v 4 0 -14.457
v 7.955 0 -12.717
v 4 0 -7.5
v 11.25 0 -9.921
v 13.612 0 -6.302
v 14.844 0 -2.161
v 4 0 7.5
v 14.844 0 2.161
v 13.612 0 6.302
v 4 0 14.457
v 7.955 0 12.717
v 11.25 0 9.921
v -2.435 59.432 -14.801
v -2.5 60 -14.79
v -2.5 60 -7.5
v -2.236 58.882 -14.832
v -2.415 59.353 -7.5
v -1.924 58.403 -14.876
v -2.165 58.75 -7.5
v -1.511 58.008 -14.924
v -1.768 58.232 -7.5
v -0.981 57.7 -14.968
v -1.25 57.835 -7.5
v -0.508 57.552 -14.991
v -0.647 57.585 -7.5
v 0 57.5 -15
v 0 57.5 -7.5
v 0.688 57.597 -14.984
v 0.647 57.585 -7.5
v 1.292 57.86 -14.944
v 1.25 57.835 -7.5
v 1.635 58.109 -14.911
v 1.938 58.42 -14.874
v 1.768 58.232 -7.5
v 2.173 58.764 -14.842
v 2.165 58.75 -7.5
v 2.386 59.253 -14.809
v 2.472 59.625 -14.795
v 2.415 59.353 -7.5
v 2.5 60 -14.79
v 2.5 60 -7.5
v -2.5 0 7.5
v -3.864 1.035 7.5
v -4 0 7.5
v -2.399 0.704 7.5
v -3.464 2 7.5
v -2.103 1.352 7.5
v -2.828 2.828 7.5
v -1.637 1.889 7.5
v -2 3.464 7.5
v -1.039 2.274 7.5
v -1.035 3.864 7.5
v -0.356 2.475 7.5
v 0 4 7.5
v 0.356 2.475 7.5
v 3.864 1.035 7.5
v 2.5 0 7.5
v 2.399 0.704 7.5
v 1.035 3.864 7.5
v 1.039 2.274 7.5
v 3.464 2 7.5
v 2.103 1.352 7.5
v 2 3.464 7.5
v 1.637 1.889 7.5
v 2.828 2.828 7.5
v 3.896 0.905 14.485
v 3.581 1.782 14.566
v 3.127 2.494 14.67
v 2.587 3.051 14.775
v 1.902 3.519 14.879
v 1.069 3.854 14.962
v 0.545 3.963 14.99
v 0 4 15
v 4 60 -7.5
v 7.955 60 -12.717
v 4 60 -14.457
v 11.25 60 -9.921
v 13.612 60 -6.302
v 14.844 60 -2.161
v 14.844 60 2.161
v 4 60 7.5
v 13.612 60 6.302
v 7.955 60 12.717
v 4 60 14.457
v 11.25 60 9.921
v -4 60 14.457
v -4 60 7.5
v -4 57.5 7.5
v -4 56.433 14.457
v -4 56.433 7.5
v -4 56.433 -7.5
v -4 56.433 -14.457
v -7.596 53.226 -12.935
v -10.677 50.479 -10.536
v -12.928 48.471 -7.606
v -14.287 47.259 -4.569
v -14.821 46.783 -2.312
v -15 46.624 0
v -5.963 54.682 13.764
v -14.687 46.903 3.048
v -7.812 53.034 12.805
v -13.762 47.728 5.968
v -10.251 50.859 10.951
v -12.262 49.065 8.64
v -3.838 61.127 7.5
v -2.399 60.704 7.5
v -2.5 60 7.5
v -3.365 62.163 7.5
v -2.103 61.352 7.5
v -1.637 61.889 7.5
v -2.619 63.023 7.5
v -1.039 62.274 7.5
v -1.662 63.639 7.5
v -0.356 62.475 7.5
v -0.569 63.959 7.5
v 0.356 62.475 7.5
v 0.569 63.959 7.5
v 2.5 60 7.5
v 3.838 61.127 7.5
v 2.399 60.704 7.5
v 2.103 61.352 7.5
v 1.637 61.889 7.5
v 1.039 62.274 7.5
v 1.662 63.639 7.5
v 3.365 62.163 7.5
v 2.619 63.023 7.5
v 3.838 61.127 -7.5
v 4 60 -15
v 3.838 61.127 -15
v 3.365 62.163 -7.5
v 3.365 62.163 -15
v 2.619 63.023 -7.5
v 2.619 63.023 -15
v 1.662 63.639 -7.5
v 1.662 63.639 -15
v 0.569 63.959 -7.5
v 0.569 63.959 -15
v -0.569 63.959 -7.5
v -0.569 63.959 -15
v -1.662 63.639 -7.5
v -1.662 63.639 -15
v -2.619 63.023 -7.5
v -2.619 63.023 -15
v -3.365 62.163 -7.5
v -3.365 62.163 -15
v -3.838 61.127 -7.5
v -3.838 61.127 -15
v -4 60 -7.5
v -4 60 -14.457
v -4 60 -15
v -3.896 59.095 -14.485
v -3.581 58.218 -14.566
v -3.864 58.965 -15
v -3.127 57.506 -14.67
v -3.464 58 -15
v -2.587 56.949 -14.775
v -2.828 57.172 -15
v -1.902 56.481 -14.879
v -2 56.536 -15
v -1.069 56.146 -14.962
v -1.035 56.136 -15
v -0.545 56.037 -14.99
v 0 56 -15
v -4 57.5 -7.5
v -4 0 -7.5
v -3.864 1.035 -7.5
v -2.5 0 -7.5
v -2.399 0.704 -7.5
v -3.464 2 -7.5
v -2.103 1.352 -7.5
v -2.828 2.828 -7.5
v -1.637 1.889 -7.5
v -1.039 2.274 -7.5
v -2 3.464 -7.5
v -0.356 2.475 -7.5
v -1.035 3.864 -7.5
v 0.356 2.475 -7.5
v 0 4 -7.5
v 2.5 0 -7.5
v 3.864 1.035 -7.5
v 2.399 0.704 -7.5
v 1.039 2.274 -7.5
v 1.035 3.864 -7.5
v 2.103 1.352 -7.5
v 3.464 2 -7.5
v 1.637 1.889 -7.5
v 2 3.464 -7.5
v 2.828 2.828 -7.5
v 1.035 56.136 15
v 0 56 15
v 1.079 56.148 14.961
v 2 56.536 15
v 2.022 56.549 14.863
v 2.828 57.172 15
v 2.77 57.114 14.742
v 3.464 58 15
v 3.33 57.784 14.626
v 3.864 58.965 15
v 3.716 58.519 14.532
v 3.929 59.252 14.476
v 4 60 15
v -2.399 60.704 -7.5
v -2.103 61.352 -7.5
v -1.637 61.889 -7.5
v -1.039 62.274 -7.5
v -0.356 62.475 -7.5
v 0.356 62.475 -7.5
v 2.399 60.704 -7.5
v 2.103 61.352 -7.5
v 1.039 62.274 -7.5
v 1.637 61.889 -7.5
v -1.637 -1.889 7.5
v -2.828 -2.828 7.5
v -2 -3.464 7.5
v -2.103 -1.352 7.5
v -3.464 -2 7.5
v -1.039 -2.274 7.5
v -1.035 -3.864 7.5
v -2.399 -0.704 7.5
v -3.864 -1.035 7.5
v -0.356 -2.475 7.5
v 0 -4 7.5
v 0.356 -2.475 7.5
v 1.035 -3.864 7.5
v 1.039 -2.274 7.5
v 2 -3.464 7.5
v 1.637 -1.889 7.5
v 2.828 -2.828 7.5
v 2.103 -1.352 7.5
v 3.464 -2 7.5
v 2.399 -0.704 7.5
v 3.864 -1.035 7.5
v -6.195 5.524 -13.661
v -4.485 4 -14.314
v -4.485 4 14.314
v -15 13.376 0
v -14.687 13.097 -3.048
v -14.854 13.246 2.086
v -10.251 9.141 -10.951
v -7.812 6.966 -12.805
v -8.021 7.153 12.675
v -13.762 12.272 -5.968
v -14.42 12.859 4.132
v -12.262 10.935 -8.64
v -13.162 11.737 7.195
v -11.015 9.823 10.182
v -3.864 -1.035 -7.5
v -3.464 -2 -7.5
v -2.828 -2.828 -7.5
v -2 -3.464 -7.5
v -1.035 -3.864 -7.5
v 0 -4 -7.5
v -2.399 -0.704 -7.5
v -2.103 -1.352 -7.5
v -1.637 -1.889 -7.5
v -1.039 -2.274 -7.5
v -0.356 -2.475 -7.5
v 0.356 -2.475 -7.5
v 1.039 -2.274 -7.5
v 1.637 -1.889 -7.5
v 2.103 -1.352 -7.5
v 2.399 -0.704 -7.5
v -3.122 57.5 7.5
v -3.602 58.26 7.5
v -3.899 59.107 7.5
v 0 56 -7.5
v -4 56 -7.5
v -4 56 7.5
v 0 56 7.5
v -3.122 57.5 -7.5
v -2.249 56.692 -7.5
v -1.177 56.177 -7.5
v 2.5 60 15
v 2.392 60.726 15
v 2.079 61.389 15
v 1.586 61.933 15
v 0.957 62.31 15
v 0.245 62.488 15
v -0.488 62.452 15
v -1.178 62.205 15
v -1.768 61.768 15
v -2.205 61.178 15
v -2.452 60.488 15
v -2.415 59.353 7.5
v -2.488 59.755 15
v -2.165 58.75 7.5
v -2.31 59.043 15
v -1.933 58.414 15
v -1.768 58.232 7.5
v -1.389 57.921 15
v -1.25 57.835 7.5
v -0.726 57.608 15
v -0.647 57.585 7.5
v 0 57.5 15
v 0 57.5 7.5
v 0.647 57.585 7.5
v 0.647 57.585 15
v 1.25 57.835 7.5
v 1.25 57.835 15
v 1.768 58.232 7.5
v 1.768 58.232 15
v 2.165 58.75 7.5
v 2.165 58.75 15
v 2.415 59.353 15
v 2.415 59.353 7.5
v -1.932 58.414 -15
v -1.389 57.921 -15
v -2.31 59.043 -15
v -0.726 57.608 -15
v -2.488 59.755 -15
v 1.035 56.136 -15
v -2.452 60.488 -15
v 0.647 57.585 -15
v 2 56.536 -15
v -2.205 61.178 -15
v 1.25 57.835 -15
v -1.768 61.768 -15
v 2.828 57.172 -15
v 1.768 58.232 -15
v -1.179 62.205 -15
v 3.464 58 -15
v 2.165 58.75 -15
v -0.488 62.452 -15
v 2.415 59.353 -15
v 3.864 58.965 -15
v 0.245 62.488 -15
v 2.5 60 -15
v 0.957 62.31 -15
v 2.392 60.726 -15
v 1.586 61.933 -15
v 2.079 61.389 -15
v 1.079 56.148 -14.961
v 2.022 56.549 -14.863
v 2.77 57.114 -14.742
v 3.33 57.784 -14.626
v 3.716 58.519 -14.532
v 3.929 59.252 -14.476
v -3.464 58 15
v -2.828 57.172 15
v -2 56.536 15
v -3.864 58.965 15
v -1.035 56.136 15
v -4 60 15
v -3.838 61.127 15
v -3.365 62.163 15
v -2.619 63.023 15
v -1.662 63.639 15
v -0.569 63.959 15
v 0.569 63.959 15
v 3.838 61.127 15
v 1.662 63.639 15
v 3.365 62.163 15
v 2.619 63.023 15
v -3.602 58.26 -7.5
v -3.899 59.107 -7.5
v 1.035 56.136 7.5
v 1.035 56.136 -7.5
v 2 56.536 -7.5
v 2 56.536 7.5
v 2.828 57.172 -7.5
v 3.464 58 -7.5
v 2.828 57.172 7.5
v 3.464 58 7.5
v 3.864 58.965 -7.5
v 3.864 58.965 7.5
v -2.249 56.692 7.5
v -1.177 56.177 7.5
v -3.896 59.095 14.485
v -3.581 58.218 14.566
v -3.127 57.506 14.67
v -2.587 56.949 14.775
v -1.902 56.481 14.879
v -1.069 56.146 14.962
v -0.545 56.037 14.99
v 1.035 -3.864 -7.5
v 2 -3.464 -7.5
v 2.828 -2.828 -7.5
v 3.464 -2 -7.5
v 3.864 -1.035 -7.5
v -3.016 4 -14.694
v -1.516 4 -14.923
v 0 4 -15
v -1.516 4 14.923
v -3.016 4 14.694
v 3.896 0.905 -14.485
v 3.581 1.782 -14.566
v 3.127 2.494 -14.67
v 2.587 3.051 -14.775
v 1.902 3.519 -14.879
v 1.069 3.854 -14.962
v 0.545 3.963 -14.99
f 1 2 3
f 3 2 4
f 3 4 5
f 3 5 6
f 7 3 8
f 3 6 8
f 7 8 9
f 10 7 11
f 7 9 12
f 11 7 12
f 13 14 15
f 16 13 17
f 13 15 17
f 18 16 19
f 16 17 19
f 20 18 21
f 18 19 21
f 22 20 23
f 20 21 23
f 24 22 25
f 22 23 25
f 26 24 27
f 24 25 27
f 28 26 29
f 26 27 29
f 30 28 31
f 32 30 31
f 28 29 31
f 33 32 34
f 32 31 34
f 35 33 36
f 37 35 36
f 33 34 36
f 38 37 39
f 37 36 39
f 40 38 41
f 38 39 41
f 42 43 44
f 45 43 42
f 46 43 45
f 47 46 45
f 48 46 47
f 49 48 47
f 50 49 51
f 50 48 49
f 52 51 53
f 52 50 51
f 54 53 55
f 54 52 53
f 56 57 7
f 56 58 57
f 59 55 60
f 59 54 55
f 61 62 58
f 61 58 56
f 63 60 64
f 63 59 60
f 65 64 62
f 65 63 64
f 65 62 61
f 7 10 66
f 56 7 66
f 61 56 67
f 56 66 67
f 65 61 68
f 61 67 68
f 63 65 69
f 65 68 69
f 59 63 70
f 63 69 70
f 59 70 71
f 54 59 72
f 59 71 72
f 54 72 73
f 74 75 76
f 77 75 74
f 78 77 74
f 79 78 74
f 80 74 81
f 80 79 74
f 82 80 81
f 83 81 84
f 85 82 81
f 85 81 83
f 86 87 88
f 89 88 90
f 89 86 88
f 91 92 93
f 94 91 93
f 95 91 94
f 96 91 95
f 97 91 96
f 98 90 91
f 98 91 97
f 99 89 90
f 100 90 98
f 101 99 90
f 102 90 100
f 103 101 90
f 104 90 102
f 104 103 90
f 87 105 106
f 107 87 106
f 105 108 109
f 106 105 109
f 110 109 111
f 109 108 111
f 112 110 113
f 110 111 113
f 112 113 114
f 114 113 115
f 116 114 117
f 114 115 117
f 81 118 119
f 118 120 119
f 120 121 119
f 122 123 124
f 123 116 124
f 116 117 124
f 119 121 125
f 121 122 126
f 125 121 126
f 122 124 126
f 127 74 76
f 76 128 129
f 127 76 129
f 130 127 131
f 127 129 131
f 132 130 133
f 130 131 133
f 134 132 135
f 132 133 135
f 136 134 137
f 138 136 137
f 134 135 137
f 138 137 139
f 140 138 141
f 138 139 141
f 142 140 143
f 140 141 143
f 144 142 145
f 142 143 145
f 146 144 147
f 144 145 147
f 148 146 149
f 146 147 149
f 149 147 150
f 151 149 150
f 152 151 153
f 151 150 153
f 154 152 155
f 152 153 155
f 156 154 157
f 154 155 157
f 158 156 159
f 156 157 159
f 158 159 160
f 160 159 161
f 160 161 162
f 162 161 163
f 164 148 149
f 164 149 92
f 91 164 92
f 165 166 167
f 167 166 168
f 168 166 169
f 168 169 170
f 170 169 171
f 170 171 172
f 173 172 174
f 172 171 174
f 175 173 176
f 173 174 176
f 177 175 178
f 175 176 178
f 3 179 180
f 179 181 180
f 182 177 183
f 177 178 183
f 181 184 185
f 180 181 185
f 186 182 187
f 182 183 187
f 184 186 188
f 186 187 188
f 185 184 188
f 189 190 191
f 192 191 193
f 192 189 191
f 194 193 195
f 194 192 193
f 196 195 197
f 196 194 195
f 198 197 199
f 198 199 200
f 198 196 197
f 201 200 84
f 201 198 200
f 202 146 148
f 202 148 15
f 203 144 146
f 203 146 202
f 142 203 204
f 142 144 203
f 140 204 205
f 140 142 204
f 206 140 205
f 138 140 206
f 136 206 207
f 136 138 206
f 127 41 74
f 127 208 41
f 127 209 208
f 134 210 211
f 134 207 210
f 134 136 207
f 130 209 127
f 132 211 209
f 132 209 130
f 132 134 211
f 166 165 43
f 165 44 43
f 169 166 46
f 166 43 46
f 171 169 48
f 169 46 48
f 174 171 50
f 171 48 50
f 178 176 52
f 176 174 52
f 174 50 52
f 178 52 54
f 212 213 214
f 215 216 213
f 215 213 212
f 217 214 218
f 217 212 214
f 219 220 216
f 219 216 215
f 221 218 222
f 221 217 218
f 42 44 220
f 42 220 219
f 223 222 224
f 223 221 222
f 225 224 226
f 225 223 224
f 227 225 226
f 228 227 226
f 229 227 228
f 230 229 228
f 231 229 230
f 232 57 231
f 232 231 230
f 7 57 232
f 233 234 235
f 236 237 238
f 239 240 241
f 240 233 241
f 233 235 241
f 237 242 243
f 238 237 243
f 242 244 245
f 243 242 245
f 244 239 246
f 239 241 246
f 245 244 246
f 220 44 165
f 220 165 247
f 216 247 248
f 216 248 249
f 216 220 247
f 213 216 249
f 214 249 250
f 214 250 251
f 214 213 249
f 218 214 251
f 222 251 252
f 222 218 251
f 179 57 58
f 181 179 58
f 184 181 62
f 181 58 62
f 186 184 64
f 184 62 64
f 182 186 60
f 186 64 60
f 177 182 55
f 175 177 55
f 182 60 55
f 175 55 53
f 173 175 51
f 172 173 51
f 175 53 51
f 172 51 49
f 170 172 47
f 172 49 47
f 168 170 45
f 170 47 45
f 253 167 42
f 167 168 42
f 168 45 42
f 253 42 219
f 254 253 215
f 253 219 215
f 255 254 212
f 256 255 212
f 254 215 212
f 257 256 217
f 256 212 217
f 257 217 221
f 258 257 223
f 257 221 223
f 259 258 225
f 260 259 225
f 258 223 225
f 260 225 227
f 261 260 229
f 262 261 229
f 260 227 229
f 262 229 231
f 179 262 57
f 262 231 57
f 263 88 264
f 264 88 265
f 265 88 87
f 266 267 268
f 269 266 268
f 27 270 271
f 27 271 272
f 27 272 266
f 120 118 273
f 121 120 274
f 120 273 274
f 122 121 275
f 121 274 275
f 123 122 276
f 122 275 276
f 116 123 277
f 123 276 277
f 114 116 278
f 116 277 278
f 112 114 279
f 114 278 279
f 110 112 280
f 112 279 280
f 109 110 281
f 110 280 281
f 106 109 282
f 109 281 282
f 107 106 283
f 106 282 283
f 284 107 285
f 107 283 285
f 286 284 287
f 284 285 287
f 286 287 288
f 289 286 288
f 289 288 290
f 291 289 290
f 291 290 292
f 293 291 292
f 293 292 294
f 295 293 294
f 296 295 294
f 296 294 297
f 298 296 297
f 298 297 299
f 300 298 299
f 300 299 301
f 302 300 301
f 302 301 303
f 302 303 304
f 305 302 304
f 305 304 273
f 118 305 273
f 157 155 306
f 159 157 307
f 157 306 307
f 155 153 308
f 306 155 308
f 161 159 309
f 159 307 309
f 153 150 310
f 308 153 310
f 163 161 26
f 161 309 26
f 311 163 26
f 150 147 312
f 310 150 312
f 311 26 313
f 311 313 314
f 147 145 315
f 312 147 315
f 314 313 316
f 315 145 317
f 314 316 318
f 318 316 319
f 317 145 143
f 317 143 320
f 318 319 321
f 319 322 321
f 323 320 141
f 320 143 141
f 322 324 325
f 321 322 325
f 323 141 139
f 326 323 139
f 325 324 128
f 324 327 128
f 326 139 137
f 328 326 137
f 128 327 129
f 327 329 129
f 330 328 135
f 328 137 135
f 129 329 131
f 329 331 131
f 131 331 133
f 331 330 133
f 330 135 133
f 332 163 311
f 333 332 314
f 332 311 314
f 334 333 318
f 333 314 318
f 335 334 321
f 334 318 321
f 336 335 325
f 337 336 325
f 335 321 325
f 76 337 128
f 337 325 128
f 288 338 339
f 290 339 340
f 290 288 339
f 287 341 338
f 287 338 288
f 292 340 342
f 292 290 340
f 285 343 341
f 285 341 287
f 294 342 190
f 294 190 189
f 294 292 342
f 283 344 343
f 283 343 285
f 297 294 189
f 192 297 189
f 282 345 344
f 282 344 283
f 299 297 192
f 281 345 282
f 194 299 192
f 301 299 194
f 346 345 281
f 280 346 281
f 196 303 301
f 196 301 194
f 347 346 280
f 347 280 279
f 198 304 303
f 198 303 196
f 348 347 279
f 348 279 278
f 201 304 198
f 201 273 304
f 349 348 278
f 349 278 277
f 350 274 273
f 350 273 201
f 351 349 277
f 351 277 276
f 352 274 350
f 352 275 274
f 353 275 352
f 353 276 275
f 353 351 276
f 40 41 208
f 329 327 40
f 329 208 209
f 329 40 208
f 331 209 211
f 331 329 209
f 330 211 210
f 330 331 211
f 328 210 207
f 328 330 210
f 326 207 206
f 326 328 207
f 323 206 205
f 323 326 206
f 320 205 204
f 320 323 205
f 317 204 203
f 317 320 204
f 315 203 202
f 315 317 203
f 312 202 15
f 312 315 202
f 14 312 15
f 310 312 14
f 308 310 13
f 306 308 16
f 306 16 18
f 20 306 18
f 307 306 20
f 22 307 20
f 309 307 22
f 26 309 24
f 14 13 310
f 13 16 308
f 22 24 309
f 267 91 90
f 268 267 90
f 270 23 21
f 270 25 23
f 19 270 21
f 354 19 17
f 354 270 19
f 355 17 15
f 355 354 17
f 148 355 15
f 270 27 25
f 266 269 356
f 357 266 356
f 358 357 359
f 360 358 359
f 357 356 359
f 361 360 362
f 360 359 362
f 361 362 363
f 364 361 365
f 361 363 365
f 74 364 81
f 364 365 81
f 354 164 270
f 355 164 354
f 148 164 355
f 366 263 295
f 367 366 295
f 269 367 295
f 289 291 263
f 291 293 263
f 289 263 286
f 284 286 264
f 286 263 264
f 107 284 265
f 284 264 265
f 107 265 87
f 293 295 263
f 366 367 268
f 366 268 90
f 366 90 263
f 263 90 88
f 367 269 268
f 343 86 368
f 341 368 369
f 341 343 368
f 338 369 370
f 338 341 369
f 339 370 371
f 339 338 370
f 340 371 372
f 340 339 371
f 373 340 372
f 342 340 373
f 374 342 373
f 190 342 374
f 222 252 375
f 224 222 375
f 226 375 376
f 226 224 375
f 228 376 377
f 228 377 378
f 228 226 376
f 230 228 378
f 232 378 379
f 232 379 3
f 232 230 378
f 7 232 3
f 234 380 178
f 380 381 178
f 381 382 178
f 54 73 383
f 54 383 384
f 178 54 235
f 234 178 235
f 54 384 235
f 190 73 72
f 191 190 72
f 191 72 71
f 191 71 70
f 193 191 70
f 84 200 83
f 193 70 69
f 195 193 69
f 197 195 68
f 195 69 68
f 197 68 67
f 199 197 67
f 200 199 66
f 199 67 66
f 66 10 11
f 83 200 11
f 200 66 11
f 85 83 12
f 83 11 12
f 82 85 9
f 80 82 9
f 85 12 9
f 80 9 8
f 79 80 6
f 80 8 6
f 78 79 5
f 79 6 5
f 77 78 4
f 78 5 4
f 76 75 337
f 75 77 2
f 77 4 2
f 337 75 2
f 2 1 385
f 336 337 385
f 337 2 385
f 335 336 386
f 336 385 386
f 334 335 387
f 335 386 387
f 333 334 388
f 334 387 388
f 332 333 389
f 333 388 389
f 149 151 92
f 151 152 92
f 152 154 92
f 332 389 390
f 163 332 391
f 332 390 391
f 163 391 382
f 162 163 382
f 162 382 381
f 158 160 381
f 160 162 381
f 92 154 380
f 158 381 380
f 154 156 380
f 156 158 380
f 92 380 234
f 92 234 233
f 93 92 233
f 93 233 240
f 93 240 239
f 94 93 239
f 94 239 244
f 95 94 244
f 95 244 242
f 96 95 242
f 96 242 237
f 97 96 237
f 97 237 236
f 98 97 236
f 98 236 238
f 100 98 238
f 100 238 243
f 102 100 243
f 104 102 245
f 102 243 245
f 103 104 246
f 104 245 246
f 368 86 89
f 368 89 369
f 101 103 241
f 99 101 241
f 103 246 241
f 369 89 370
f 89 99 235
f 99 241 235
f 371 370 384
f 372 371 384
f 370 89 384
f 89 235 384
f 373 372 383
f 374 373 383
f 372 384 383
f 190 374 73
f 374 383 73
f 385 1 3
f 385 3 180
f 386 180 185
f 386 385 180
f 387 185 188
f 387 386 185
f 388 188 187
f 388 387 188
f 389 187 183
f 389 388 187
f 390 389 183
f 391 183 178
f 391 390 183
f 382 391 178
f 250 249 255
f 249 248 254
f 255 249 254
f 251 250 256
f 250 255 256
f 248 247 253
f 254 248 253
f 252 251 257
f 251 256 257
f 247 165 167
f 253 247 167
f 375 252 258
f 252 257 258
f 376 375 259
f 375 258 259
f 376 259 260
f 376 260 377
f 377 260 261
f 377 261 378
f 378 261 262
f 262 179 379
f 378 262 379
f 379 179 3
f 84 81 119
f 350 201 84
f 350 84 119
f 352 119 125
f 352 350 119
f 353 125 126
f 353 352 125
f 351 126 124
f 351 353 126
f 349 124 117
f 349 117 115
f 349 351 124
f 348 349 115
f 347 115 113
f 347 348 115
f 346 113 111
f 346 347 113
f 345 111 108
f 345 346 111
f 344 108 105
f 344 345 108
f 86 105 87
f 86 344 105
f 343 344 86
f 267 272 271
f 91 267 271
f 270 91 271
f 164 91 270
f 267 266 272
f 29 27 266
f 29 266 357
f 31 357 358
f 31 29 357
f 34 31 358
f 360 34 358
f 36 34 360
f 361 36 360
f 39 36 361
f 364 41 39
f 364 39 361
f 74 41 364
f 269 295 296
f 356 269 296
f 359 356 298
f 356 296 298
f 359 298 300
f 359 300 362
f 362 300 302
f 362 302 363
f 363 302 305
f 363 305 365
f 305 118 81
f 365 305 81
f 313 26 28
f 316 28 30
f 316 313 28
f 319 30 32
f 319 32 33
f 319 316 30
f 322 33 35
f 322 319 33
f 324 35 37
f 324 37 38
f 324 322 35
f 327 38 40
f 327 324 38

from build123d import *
from build123d.topology import SkipClean

# Parameters (mm, degrees)
CROQUIS1_R              = 15
SALIENTE_EXTRUIR1_DEPTH = 60
CROQUIS8_R              = 2.5
CORTAR_EXTRUIR2_DEPTH   = 15
SALIENTE_EXTRUIR3_START = 15
CROQUIS9_R              = 4
CROQUIS9_R_2            = 2.5
SALIENTE_EXTRUIR3_DEPTH = 7.5
CROQUIS10_R             = 4
SALIENTE_EXTRUIR4_DEPTH = 7.5
CROQUIS12_R             = 2.5
CORTAR_EXTRUIR4_DEPTH   = 30
CORTAR_EXTRUIR5_START   = 37.5
CROQUIS13_R             = 4
CORTAR_EXTRUIR5_DEPTH   = 30
CORTAR_EXTRUIR6_DEPTH   = 15
CROQUIS14_W             = 15
CROQUIS14_H             = 2.5
CORTAR_EXTRUIR7_DEPTH   = 4
CORTAR_EXTRUIR8_DEPTH   = 15
CROQUIS16_R             = 4
CORTAR_EXTRUIR9_DEPTH   = 7.5
CROQUIS17_W             = 15
CROQUIS17_H             = 4
CORTAR_EXTRUIR10_DEPTH  = 4


with BuildPart() as part:
    # Croquis1 → Saliente-Extruir1 (new body)
    with BuildSketch(Plane(origin=(0, 0, 0), x_dir=(1, 0, 0), z_dir=(0, 1, 0))):
        Circle(CROQUIS1_R)
    extrude(amount=SALIENTE_EXTRUIR1_DEPTH)

    # Croquis8 → Cortar-Extruir2 (cut, symmetric)
    with BuildSketch(Plane.XY):
        with Locations((0, 60)):
            Circle(CROQUIS8_R)
    extrude(amount=CORTAR_EXTRUIR2_DEPTH, both=True, mode=Mode.SUBTRACT)

    # Croquis9 → Saliente-Extruir3 (add)
    with BuildSketch(Plane.XY.offset(SALIENTE_EXTRUIR3_START)):
        with Locations((0, 60)):
            Circle(CROQUIS9_R)
        with Locations((0, 60)):
            Circle(CROQUIS9_R_2, mode=Mode.SUBTRACT)
    saliente_extruir3 = extrude(amount=-SALIENTE_EXTRUIR3_DEPTH)

    # Simetría2: Saliente-Extruir3 across plane
    with SkipClean():  # the faces are left unmerged after this step: merging them gives an invalid solid
        add(saliente_extruir3.mirror(Plane.XY))

    # Croquis10 → Saliente-Extruir4 (add, symmetric)
    with SkipClean():  # the faces are left unmerged after this step: merging them gives an invalid solid
        with BuildSketch(Plane.XY):
            Circle(CROQUIS10_R)
        extrude(amount=SALIENTE_EXTRUIR4_DEPTH, both=True)

    # Croquis12 → Cortar-Extruir4 (cut, symmetric)
    with SkipClean():  # the faces are left unmerged after this step: merging them gives an invalid solid
        with BuildSketch(Plane.XY.offset(7.5)):
            Circle(CROQUIS12_R)
        extrude(amount=CORTAR_EXTRUIR4_DEPTH, both=True, mode=Mode.SUBTRACT)

    # Croquis13 → Cortar-Extruir5 (cut)
    with SkipClean():  # the faces are left unmerged after this step: merging them gives an invalid solid
        with BuildSketch(Plane.XY.offset(CORTAR_EXTRUIR5_START)):
            Circle(CROQUIS13_R)
        cortar_extruir5 = extrude(amount=-CORTAR_EXTRUIR5_DEPTH, mode=Mode.SUBTRACT)

    # Simetría3: Cortar-Extruir5 across plane
    with SkipClean():  # the faces are left unmerged after this step: merging them gives an invalid solid
        add(cortar_extruir5.mirror(Plane.XY), mode=Mode.SUBTRACT)

    # Croquis7 → Cortar-Extruir6 (cut, symmetric)
    with SkipClean():  # the faces are left unmerged after this step: merging them gives an invalid solid
        with BuildSketch(Plane.XY):
            Polygon((-4, 56.432940258), (-15, 46.623525966), (-15, 60), (-4, 60), align=None)
        cortar_extruir6 = extrude(amount=CORTAR_EXTRUIR6_DEPTH, both=True, mode=Mode.SUBTRACT)

    # Croquis14 → Cortar-Extruir7 (cut)
    with SkipClean():  # the faces are left unmerged after this step: merging them gives an invalid solid
        with BuildSketch(Plane.ZY.offset(4)):
            with Locations((0, 58.75)):
                Rectangle(CROQUIS14_W, CROQUIS14_H)
        extrude(amount=-CORTAR_EXTRUIR7_DEPTH, mode=Mode.SUBTRACT)

    # Simetría4: Cortar-Extruir6 across plane
    with SkipClean():  # the faces are left unmerged after this step: merging them gives an invalid solid
        add(cortar_extruir6.mirror(Plane.ZX.offset(30)), mode=Mode.SUBTRACT)

    # Croquis15 → Cortar-Extruir8 (cut, symmetric)
    with SkipClean():  # the faces are left unmerged after this step: merging them gives an invalid solid
        with BuildSketch(Plane.XY):
            with BuildLine():
                Line((0, 4), (-8.002010921, 4))
                Line((-8.002010921, 4), (-8.002010921, -4.658510033))
                Line((-8.002010921, -4.658510033), (0, -4.658510033))
                Line((0, -4.658510033), (0, -4))
                ThreePointArc((0, -4), (-4, 0), (0, 4))
            make_face()
        extrude(amount=CORTAR_EXTRUIR8_DEPTH, both=True, mode=Mode.SUBTRACT)

    # Croquis16 → Cortar-Extruir9 (cut, symmetric)
    with SkipClean():  # the faces are left unmerged after this step: merging them gives an invalid solid
        with BuildSketch(Plane.XY):
            with Locations((0, 60)):
                Circle(CROQUIS16_R)
        extrude(amount=CORTAR_EXTRUIR9_DEPTH, both=True, mode=Mode.SUBTRACT)

    # Croquis17 → Cortar-Extruir10 (cut)
    with SkipClean():  # the faces are left unmerged after this step: merging them gives an invalid solid
        with BuildSketch(Plane.ZY.offset(4)):
            with Locations((0, 58)):
                Rectangle(CROQUIS17_W, CROQUIS17_H)
        extrude(amount=-CORTAR_EXTRUIR10_DEPTH, mode=Mode.SUBTRACT)


solid = part.part
